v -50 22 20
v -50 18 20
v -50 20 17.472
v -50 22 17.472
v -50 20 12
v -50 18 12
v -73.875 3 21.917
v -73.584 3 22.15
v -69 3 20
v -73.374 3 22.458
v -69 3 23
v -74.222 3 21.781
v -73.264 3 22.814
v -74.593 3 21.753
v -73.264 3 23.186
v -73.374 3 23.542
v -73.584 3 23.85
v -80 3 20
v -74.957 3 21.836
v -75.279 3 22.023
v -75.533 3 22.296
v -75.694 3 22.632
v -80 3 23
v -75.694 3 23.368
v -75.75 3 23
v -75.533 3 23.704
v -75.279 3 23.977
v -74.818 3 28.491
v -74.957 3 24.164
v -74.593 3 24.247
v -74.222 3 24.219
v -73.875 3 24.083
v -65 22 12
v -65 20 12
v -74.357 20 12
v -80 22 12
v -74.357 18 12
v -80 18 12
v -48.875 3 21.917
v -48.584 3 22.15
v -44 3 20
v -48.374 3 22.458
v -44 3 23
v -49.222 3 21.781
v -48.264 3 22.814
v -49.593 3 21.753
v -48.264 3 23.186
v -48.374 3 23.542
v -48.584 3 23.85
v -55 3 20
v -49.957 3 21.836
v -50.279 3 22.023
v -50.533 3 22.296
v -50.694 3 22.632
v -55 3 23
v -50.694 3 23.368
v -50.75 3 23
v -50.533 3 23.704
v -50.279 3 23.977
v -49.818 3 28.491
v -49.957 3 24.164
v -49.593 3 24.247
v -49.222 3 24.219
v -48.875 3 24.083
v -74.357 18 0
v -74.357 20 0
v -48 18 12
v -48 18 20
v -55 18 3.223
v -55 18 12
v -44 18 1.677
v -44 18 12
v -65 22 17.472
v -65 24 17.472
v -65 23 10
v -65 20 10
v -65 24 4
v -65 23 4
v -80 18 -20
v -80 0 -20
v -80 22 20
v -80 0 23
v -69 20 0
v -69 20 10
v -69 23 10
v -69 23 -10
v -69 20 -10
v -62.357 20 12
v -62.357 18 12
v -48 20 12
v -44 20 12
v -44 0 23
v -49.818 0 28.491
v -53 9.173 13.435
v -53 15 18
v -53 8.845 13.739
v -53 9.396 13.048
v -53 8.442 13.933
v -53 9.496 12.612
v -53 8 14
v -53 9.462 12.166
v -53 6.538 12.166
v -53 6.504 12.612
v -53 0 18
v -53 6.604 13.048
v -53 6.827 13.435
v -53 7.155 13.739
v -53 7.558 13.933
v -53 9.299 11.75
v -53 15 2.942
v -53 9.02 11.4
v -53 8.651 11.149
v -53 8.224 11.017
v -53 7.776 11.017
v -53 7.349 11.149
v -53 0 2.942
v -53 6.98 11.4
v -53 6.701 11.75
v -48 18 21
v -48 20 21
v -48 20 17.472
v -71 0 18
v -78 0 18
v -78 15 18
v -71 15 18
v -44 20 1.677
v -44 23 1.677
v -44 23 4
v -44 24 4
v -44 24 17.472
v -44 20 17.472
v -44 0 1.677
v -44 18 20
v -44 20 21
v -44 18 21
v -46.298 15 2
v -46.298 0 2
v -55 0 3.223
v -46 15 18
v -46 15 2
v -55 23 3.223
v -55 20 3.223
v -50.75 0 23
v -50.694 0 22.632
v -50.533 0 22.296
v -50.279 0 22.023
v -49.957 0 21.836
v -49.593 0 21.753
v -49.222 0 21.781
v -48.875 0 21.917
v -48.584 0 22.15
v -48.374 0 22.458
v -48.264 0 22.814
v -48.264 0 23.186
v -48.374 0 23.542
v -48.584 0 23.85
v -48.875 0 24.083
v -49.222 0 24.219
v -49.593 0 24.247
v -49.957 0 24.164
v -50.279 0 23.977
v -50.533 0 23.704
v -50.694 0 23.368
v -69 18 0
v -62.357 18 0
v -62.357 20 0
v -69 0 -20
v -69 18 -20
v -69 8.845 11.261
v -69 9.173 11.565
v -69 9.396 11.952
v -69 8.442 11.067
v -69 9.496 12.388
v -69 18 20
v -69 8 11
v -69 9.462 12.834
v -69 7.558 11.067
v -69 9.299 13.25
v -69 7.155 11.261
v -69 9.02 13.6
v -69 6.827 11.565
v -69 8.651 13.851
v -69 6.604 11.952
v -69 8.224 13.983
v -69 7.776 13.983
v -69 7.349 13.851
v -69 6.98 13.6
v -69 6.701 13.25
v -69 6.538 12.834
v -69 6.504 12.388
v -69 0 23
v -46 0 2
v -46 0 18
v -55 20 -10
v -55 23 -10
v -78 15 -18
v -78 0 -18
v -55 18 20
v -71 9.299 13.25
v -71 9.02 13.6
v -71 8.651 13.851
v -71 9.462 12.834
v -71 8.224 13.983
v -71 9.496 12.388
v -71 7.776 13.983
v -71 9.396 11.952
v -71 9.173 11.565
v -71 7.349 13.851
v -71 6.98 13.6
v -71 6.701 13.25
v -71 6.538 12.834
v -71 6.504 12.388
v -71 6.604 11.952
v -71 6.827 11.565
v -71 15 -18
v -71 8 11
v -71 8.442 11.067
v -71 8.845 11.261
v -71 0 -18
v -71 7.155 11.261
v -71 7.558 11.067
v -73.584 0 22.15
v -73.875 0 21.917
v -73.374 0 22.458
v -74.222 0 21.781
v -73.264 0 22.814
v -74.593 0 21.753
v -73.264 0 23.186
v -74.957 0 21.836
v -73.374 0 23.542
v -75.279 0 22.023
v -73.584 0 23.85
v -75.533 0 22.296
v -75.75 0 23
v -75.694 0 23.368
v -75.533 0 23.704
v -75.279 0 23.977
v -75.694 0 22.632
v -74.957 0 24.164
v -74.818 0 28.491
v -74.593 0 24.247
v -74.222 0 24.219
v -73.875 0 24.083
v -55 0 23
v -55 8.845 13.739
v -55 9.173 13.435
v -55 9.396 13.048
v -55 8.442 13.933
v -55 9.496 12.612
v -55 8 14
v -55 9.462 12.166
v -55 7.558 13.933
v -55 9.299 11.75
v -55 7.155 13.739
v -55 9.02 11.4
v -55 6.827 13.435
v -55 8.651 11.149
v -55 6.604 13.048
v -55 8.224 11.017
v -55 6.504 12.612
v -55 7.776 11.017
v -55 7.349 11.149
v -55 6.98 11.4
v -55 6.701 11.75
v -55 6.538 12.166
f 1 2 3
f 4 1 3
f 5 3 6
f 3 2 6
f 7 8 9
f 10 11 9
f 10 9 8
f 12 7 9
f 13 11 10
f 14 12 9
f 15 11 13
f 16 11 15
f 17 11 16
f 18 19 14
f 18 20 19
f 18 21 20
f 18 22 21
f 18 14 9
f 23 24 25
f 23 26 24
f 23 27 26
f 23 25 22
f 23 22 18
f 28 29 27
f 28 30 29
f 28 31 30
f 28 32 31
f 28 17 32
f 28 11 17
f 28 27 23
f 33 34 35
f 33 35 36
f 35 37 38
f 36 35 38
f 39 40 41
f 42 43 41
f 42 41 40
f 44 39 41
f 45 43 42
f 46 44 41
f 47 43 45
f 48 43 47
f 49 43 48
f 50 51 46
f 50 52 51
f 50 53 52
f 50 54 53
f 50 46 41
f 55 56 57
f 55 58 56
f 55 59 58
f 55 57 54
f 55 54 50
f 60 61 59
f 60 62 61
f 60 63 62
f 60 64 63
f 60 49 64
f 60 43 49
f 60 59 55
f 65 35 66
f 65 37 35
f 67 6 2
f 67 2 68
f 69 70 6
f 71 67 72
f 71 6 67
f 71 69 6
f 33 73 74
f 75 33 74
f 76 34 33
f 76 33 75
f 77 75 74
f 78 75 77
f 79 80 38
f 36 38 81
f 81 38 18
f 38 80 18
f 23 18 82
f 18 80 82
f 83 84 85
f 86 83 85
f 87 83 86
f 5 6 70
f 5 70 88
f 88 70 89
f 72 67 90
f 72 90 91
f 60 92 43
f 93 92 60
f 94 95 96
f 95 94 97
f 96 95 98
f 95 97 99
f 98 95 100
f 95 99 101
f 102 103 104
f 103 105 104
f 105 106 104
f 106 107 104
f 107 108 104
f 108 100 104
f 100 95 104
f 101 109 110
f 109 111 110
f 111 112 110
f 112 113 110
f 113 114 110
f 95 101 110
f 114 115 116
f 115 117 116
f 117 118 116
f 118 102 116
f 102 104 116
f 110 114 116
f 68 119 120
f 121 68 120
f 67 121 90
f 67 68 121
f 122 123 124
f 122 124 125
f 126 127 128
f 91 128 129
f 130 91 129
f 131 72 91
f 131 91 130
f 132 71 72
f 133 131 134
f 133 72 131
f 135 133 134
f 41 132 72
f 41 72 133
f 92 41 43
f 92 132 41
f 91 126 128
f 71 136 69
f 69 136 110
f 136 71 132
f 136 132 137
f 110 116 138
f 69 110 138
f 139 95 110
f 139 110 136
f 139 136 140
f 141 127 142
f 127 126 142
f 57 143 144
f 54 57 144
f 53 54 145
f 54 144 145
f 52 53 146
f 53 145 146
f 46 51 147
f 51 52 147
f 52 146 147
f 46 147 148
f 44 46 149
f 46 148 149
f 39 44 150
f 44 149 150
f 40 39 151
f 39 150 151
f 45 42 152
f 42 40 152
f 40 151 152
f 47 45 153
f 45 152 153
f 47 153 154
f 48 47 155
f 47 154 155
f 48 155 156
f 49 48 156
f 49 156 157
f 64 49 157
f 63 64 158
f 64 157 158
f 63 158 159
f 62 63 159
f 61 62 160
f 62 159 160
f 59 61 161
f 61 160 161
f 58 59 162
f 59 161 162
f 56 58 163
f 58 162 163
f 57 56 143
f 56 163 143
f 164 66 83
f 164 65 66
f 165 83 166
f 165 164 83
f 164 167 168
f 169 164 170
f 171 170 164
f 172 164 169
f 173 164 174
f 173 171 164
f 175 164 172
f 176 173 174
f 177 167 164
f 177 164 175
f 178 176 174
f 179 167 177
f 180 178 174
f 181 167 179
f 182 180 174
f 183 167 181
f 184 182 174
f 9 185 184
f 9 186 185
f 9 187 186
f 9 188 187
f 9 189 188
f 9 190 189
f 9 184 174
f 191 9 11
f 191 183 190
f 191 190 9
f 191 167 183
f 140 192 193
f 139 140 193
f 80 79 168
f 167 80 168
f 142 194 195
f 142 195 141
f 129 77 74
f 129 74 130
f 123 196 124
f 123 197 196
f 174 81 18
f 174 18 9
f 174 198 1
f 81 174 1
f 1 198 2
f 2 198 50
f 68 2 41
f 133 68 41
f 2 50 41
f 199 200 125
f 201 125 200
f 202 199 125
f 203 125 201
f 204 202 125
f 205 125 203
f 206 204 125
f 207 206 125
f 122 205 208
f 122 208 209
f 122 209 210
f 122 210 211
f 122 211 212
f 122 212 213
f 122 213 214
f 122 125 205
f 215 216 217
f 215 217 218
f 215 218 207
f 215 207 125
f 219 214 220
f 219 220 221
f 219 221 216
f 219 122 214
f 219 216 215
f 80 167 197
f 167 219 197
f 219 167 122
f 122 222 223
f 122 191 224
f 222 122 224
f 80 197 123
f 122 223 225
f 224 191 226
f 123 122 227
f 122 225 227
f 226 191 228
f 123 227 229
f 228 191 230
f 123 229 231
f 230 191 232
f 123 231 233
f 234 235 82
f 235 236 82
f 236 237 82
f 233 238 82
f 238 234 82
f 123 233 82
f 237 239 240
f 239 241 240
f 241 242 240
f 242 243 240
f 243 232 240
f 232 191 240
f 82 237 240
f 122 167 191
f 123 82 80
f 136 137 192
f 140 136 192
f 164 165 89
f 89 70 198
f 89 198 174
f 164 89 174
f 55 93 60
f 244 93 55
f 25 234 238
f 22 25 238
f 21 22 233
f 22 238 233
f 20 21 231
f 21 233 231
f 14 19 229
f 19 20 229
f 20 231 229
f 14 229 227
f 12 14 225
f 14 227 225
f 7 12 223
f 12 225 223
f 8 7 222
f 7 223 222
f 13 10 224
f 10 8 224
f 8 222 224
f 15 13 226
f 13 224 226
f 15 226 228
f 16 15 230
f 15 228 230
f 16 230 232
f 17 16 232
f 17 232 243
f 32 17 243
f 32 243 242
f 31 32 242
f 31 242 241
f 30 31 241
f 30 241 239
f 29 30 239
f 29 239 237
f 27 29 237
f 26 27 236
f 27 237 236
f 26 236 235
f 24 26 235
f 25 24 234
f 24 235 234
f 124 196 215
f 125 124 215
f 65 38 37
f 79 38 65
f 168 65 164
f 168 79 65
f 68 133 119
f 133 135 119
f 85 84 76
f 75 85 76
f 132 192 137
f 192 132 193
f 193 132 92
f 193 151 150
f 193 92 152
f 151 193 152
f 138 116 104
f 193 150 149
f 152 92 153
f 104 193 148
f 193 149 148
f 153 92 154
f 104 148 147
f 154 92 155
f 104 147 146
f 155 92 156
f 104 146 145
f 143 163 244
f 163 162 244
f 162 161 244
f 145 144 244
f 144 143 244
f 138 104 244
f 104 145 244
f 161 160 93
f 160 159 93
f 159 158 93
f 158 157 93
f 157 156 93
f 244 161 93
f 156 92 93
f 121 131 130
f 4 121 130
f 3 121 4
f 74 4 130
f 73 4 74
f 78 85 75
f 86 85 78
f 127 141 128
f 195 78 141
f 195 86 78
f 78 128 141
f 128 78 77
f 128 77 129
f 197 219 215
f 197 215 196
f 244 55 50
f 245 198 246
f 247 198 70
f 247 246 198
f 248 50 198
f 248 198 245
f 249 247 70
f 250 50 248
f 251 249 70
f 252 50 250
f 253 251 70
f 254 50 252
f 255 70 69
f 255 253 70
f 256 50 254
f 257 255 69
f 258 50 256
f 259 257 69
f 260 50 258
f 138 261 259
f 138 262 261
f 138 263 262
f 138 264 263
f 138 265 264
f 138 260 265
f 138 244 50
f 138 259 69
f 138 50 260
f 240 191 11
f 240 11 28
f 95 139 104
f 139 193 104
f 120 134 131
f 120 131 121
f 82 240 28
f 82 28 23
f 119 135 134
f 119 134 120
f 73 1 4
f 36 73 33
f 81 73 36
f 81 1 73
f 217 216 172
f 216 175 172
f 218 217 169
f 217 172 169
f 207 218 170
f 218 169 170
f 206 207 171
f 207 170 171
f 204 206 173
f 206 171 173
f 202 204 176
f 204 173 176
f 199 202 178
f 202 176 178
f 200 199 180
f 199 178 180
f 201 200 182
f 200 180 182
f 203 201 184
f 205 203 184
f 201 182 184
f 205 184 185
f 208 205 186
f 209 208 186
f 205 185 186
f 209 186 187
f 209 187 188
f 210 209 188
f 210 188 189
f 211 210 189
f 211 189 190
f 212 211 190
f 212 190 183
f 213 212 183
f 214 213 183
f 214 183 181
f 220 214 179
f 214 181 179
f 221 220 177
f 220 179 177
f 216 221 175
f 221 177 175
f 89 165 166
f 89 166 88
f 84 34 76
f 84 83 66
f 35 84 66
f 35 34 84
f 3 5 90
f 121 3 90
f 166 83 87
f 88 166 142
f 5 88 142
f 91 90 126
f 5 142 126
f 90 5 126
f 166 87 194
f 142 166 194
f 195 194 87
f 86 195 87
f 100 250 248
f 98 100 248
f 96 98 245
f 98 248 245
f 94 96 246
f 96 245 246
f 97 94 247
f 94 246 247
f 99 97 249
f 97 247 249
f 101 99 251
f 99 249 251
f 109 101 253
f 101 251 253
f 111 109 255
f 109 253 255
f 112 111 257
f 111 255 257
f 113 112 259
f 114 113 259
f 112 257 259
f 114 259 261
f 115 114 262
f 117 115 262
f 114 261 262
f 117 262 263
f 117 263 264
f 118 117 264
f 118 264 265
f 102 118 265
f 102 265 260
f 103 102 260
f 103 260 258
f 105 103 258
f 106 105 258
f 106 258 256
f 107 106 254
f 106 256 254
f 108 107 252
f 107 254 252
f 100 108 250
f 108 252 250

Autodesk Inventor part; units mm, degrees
ref_plane "YZ Plane" through (0, 0, 0) normal (1, 0, 0) x (0, 1, 0)
ref_plane "XY Plane" through (0, 0, 0) normal (0, 0, 1) x (1, 0, 0)
sketch "Sketch1" plane through (0, 0, 0) normal (0, 1, 0) x (-1, 0, 0)
  line L0 (0, 0) -> (80, 0) construction
  line L1 (80, 0) -> (80, 15) construction
  line L2 (80, 15) -> (0, 15) construction
  line L3 (0, 15) -> (0, 0) construction
  dimension "d0" = 80
  dimension "d1" = 15
sketch "Sketch2" plane through (0, 0, 0) normal (0, 1, 0) x (-1, 0, 0)
  line L0 (80, -20) -> (69, -20)
  line L1 (69, -20) -> (69, 20)
  line L2 (69, 20) -> (80, 20)
  line L3 (80, 20) -> (80, -20)
  line L4 (55, 0) -> (44, 0)
  line L5 (44, 0) -> (44, 20)
  line L6 (44, 20) -> (55, 20)
  line L7 (55, 20) -> (55, 0)
  line L8 (71, -18) -> (78, -18)
  line L9 (78, -18) -> (78, 18)
  line L10 (78, 18) -> (71, 18)
  line L11 (71, 18) -> (71, -18)
  line L12 (53, 2) -> (46, 2)
  line L13 (46, 2) -> (46, 18)
  line L14 (46, 18) -> (53, 18)
  line L15 (53, 18) -> (53, 2)
  dimension "d2" = 11
  dimension "d3" = 40
  dimension "d6" = 11
  dimension "d10" = 2
  dimension "d11" = 2
  dimension "d110" = 20
  dimension "d111" = 14
extrude "Extrusion1" add sketch "Sketch2" along normal blind 15
sketch "Sketch3" plane through (0, 15, 0) normal (0, 1, 0) x (1, 0, 0)
  line L0 (-69, 20) -> (-80, 20) projected
  line L1 (-80, 20) -> (-69, 20)
  line L2 (-69, 20) -> (-69, -20)
  line L3 (-69, -20) -> (-80, -20)
  line L4 (-80, -20) -> (-80, 20)
  line L5 (-55, -20) -> (-44, -20) projected
  line L6 (-44, -20) -> (-55, -20)
  line L7 (-55, -20) -> (-55, 0)
  line L8 (-55, 0) -> (-44, 0)
  line L9 (-44, 0) -> (-44, -20)
  point P0 (0, 0)
  dimension "d16" = 40
extrude "Extrusion2" add sketch "Sketch3" along normal blind 3
sketch "Sketch4" plane through (-69, 0, 20) normal (1, 0, 0) x (0, 0, -1)
  circle A0 centre (7.5, 8) radius 1.5
  line L0 (2, 0) -> (38, 0) projected
  line L1 (0, 0) -> (0, 18) construction
  point P0 (0, 15)
  dimension "d26" = 3
  dimension "d28" = 8
  dimension "d29" = 7.5
extrude "Extrusion3" cut sketch "Sketch4" against normal blind 3
sketch "Sketch5" plane through (-55, 0, 0) normal (-1, 0, 0) x (0, 0, 1)
  circle A0 centre (12.5, 8) radius 1.5
  line L0 (20, 0) -> (20, 18) projected
  line L1 (2, 0) -> (18, 0) projected
  point P0 (0, 0)
  point P1 (20, 15)
  dimension "d33" = 3
  dimension "d34" = 7.5
  dimension "d35" = 8
extrude "Extrusion4" cut sketch "Sketch5" against normal blind 3
ref_plane "Work Plane1" through (0, 18, 0) normal (0, 1, 0) x (-1, 0, 0)
sketch "Sketch12" plane through (0, 18, 0) normal (0, 1, 0) x (-1, 0, 0)
  line L0 (80, 20) -> (50, 20)
  line L1 (50, 20) -> (50, 12)
  line L2 (50, 12) -> (80, 12)
  line L3 (80, 12) -> (80, 20)
  line L4 (55, 8) -> (55, 0)
  dimension "d59" = 30
  dimension "d60" = 8
sketch "Sketch13" plane through (0, 18, 0) normal (0, 1, 0) x (-1, 0, 0)
  line L0 (74.3573, 0) -> (62.3573, 0)
  line L1 (62.3573, 0) -> (62.3573, 15)
  line L2 (62.3573, 15) -> (74.3573, 15)
  line L3 (74.3573, 15) -> (74.3573, 0)
  line L4 (48, 12) -> (36, 12)
  line L5 (36, 12) -> (36, 21)
  line L6 (36, 21) -> (48, 21)
  line L7 (48, 21) -> (48, 12)
  line L8 (0, 0) -> (11, 0) projected
  line L9 (4, 0) -> (17, 0)
  line L10 (17, 0) -> (17, 17)
  line L11 (17, 17) -> (4, 17)
  line L12 (4, 17) -> (4, 0)
  dimension "d64" = 12
  dimension "d65" = 15
  dimension "d66" = 12
  dimension "d67" = 13
  dimension "d68" = 17
extrude "Extrusion9" add sketch "Sketch13" along normal blind 2
extrude "Extrusion10" add sketch "Sketch12" along normal blind 4
sketch "Sketch14" plane through (0, 20, 0) normal (0, 1, 0) x (1, 0, 0)
  line L0 (-65, -4) -> (-41.7529, -4)
  line L1 (-41.7529, -4) -> (-41.7529, -17.4715)
  line L2 (-41.7529, -17.4715) -> (-65, -17.4715)
  line L3 (-65, -17.4715) -> (-65, -4)
  point P0 (0, 0)
extrude "Extrusion11" add sketch "Sketch14" along normal blind 4
sketch "Sketch15" plane through (0, 20, 0) normal (0, 1, 0) x (1, 0, 0)
  line L0 (-69, -15) -> (-69, 0) projected
  line L1 (-69, -10) -> (-17, -10)
  line L2 (-17, -10) -> (-17, 10)
  line L3 (-17, 10) -> (-69, 10)
  line L4 (-69, 10) -> (-69, -10)
  point P0 (0, 0)
  point P1 (-69, -20)
  point P2 (-69, -22)
  point P3 (-69, -20)
  dimension "d76" = 52
  dimension "d77" = 20
extrude "Extrusion12" add sketch "Sketch15" along normal blind 3
sketch "Sketch16" plane through (0, 0, 0) normal (0, 1, 0) x (-1, 0, 0)
  line L0 (69, 20) -> (80, 20) projected
  line L1 (80, 20) -> (80, 23)
  line L2 (69, 20) -> (69, 23)
  line L3 (69, 23) -> (74.8182, 28.4908)
  line L4 (74.8182, 28.4908) -> (80, 23)
  circle A0 centre (74.5, 23) radius 1.25
  line L5 (74.5, 23) -> (80, 23) construction
  line L6 (74.5, 23) -> (69, 23) construction
  line L7 (80, 15) -> (0, 15) construction
  line L8 (44, 20) -> (44, 23)
  line L9 (49.5, 23) -> (44, 23) construction
  circle A1 centre (49.5, 23) radius 1.25
  line L10 (55, 20) -> (55, 23)
  line L11 (49.5, 23) -> (55, 23) construction
  line L12 (49.8182, 28.4908) -> (55, 23)
  line L13 (44, 23) -> (49.8182, 28.4908)
  line L14 (55, 20) -> (44, 20)
  dimension "d80" = 3
  dimension "d81" = 3
  dimension "d82" = 8
  dimension "d83" = 2.5
  dimension "d84" = 3
  dimension "d96" = 25
extrude "Extrusion14" add sketch "Sketch16" along normal blind 3
sketch "Sketch17" plane through (0, 0, 0) normal (0, 1, 0) x (-1, 0, 0)
  line L0 (44, 21.1125) -> (0, 21.1125)
  line L1 (0, 21.1125) -> (0, -22.6665)
  line L2 (0, -22.6665) -> (44, -22.6665)
  line L3 (44, -22.6665) -> (44, 21.1125)
  line L4 (44, 0) -> (44, 20) projected
  line L5 (55, -0.777) -> (44, -0.777)
  line L6 (44, -0.777) -> (44, -22.6665)
  line L7 (44, -22.6665) -> (55, -22.6665)
  line L8 (55, -22.6665) -> (55, -0.777)
extrude "Extrusion15" cut sketch "Sketch17" along normal through all
sketch "Sketch18" plane through (0, 0, 0) normal (0, 1, 0) x (-1, 0, 0)
  line L0 (26.5385, -0.777) -> (55, 3.223)
  line L1 (55, 3.223) -> (55, -0.777)
  line L2 (55, -0.777) -> (26.5385, -0.777)
  line L3 (55, 23) -> (55, 0) projected
  line L4 (55, 0) -> (44, 0) projected
  line L5 (69, -20) -> (69, 23) projected
  line L6 (44, -0.777) -> (55, -0.777) projected
  point P0 (0, 0)
  point P1 (57, 20)
  point P2 (69, 20)
  dimension "d103" = 8
  dimension "d104" = 4
extrude "Extrusion16" cut sketch "Sketch18" along normal through all
equation "\"d11\" = d10"
equation "\"d81\" = d80"
equation "\"d84\" = d81"
properties part number "game-over"
